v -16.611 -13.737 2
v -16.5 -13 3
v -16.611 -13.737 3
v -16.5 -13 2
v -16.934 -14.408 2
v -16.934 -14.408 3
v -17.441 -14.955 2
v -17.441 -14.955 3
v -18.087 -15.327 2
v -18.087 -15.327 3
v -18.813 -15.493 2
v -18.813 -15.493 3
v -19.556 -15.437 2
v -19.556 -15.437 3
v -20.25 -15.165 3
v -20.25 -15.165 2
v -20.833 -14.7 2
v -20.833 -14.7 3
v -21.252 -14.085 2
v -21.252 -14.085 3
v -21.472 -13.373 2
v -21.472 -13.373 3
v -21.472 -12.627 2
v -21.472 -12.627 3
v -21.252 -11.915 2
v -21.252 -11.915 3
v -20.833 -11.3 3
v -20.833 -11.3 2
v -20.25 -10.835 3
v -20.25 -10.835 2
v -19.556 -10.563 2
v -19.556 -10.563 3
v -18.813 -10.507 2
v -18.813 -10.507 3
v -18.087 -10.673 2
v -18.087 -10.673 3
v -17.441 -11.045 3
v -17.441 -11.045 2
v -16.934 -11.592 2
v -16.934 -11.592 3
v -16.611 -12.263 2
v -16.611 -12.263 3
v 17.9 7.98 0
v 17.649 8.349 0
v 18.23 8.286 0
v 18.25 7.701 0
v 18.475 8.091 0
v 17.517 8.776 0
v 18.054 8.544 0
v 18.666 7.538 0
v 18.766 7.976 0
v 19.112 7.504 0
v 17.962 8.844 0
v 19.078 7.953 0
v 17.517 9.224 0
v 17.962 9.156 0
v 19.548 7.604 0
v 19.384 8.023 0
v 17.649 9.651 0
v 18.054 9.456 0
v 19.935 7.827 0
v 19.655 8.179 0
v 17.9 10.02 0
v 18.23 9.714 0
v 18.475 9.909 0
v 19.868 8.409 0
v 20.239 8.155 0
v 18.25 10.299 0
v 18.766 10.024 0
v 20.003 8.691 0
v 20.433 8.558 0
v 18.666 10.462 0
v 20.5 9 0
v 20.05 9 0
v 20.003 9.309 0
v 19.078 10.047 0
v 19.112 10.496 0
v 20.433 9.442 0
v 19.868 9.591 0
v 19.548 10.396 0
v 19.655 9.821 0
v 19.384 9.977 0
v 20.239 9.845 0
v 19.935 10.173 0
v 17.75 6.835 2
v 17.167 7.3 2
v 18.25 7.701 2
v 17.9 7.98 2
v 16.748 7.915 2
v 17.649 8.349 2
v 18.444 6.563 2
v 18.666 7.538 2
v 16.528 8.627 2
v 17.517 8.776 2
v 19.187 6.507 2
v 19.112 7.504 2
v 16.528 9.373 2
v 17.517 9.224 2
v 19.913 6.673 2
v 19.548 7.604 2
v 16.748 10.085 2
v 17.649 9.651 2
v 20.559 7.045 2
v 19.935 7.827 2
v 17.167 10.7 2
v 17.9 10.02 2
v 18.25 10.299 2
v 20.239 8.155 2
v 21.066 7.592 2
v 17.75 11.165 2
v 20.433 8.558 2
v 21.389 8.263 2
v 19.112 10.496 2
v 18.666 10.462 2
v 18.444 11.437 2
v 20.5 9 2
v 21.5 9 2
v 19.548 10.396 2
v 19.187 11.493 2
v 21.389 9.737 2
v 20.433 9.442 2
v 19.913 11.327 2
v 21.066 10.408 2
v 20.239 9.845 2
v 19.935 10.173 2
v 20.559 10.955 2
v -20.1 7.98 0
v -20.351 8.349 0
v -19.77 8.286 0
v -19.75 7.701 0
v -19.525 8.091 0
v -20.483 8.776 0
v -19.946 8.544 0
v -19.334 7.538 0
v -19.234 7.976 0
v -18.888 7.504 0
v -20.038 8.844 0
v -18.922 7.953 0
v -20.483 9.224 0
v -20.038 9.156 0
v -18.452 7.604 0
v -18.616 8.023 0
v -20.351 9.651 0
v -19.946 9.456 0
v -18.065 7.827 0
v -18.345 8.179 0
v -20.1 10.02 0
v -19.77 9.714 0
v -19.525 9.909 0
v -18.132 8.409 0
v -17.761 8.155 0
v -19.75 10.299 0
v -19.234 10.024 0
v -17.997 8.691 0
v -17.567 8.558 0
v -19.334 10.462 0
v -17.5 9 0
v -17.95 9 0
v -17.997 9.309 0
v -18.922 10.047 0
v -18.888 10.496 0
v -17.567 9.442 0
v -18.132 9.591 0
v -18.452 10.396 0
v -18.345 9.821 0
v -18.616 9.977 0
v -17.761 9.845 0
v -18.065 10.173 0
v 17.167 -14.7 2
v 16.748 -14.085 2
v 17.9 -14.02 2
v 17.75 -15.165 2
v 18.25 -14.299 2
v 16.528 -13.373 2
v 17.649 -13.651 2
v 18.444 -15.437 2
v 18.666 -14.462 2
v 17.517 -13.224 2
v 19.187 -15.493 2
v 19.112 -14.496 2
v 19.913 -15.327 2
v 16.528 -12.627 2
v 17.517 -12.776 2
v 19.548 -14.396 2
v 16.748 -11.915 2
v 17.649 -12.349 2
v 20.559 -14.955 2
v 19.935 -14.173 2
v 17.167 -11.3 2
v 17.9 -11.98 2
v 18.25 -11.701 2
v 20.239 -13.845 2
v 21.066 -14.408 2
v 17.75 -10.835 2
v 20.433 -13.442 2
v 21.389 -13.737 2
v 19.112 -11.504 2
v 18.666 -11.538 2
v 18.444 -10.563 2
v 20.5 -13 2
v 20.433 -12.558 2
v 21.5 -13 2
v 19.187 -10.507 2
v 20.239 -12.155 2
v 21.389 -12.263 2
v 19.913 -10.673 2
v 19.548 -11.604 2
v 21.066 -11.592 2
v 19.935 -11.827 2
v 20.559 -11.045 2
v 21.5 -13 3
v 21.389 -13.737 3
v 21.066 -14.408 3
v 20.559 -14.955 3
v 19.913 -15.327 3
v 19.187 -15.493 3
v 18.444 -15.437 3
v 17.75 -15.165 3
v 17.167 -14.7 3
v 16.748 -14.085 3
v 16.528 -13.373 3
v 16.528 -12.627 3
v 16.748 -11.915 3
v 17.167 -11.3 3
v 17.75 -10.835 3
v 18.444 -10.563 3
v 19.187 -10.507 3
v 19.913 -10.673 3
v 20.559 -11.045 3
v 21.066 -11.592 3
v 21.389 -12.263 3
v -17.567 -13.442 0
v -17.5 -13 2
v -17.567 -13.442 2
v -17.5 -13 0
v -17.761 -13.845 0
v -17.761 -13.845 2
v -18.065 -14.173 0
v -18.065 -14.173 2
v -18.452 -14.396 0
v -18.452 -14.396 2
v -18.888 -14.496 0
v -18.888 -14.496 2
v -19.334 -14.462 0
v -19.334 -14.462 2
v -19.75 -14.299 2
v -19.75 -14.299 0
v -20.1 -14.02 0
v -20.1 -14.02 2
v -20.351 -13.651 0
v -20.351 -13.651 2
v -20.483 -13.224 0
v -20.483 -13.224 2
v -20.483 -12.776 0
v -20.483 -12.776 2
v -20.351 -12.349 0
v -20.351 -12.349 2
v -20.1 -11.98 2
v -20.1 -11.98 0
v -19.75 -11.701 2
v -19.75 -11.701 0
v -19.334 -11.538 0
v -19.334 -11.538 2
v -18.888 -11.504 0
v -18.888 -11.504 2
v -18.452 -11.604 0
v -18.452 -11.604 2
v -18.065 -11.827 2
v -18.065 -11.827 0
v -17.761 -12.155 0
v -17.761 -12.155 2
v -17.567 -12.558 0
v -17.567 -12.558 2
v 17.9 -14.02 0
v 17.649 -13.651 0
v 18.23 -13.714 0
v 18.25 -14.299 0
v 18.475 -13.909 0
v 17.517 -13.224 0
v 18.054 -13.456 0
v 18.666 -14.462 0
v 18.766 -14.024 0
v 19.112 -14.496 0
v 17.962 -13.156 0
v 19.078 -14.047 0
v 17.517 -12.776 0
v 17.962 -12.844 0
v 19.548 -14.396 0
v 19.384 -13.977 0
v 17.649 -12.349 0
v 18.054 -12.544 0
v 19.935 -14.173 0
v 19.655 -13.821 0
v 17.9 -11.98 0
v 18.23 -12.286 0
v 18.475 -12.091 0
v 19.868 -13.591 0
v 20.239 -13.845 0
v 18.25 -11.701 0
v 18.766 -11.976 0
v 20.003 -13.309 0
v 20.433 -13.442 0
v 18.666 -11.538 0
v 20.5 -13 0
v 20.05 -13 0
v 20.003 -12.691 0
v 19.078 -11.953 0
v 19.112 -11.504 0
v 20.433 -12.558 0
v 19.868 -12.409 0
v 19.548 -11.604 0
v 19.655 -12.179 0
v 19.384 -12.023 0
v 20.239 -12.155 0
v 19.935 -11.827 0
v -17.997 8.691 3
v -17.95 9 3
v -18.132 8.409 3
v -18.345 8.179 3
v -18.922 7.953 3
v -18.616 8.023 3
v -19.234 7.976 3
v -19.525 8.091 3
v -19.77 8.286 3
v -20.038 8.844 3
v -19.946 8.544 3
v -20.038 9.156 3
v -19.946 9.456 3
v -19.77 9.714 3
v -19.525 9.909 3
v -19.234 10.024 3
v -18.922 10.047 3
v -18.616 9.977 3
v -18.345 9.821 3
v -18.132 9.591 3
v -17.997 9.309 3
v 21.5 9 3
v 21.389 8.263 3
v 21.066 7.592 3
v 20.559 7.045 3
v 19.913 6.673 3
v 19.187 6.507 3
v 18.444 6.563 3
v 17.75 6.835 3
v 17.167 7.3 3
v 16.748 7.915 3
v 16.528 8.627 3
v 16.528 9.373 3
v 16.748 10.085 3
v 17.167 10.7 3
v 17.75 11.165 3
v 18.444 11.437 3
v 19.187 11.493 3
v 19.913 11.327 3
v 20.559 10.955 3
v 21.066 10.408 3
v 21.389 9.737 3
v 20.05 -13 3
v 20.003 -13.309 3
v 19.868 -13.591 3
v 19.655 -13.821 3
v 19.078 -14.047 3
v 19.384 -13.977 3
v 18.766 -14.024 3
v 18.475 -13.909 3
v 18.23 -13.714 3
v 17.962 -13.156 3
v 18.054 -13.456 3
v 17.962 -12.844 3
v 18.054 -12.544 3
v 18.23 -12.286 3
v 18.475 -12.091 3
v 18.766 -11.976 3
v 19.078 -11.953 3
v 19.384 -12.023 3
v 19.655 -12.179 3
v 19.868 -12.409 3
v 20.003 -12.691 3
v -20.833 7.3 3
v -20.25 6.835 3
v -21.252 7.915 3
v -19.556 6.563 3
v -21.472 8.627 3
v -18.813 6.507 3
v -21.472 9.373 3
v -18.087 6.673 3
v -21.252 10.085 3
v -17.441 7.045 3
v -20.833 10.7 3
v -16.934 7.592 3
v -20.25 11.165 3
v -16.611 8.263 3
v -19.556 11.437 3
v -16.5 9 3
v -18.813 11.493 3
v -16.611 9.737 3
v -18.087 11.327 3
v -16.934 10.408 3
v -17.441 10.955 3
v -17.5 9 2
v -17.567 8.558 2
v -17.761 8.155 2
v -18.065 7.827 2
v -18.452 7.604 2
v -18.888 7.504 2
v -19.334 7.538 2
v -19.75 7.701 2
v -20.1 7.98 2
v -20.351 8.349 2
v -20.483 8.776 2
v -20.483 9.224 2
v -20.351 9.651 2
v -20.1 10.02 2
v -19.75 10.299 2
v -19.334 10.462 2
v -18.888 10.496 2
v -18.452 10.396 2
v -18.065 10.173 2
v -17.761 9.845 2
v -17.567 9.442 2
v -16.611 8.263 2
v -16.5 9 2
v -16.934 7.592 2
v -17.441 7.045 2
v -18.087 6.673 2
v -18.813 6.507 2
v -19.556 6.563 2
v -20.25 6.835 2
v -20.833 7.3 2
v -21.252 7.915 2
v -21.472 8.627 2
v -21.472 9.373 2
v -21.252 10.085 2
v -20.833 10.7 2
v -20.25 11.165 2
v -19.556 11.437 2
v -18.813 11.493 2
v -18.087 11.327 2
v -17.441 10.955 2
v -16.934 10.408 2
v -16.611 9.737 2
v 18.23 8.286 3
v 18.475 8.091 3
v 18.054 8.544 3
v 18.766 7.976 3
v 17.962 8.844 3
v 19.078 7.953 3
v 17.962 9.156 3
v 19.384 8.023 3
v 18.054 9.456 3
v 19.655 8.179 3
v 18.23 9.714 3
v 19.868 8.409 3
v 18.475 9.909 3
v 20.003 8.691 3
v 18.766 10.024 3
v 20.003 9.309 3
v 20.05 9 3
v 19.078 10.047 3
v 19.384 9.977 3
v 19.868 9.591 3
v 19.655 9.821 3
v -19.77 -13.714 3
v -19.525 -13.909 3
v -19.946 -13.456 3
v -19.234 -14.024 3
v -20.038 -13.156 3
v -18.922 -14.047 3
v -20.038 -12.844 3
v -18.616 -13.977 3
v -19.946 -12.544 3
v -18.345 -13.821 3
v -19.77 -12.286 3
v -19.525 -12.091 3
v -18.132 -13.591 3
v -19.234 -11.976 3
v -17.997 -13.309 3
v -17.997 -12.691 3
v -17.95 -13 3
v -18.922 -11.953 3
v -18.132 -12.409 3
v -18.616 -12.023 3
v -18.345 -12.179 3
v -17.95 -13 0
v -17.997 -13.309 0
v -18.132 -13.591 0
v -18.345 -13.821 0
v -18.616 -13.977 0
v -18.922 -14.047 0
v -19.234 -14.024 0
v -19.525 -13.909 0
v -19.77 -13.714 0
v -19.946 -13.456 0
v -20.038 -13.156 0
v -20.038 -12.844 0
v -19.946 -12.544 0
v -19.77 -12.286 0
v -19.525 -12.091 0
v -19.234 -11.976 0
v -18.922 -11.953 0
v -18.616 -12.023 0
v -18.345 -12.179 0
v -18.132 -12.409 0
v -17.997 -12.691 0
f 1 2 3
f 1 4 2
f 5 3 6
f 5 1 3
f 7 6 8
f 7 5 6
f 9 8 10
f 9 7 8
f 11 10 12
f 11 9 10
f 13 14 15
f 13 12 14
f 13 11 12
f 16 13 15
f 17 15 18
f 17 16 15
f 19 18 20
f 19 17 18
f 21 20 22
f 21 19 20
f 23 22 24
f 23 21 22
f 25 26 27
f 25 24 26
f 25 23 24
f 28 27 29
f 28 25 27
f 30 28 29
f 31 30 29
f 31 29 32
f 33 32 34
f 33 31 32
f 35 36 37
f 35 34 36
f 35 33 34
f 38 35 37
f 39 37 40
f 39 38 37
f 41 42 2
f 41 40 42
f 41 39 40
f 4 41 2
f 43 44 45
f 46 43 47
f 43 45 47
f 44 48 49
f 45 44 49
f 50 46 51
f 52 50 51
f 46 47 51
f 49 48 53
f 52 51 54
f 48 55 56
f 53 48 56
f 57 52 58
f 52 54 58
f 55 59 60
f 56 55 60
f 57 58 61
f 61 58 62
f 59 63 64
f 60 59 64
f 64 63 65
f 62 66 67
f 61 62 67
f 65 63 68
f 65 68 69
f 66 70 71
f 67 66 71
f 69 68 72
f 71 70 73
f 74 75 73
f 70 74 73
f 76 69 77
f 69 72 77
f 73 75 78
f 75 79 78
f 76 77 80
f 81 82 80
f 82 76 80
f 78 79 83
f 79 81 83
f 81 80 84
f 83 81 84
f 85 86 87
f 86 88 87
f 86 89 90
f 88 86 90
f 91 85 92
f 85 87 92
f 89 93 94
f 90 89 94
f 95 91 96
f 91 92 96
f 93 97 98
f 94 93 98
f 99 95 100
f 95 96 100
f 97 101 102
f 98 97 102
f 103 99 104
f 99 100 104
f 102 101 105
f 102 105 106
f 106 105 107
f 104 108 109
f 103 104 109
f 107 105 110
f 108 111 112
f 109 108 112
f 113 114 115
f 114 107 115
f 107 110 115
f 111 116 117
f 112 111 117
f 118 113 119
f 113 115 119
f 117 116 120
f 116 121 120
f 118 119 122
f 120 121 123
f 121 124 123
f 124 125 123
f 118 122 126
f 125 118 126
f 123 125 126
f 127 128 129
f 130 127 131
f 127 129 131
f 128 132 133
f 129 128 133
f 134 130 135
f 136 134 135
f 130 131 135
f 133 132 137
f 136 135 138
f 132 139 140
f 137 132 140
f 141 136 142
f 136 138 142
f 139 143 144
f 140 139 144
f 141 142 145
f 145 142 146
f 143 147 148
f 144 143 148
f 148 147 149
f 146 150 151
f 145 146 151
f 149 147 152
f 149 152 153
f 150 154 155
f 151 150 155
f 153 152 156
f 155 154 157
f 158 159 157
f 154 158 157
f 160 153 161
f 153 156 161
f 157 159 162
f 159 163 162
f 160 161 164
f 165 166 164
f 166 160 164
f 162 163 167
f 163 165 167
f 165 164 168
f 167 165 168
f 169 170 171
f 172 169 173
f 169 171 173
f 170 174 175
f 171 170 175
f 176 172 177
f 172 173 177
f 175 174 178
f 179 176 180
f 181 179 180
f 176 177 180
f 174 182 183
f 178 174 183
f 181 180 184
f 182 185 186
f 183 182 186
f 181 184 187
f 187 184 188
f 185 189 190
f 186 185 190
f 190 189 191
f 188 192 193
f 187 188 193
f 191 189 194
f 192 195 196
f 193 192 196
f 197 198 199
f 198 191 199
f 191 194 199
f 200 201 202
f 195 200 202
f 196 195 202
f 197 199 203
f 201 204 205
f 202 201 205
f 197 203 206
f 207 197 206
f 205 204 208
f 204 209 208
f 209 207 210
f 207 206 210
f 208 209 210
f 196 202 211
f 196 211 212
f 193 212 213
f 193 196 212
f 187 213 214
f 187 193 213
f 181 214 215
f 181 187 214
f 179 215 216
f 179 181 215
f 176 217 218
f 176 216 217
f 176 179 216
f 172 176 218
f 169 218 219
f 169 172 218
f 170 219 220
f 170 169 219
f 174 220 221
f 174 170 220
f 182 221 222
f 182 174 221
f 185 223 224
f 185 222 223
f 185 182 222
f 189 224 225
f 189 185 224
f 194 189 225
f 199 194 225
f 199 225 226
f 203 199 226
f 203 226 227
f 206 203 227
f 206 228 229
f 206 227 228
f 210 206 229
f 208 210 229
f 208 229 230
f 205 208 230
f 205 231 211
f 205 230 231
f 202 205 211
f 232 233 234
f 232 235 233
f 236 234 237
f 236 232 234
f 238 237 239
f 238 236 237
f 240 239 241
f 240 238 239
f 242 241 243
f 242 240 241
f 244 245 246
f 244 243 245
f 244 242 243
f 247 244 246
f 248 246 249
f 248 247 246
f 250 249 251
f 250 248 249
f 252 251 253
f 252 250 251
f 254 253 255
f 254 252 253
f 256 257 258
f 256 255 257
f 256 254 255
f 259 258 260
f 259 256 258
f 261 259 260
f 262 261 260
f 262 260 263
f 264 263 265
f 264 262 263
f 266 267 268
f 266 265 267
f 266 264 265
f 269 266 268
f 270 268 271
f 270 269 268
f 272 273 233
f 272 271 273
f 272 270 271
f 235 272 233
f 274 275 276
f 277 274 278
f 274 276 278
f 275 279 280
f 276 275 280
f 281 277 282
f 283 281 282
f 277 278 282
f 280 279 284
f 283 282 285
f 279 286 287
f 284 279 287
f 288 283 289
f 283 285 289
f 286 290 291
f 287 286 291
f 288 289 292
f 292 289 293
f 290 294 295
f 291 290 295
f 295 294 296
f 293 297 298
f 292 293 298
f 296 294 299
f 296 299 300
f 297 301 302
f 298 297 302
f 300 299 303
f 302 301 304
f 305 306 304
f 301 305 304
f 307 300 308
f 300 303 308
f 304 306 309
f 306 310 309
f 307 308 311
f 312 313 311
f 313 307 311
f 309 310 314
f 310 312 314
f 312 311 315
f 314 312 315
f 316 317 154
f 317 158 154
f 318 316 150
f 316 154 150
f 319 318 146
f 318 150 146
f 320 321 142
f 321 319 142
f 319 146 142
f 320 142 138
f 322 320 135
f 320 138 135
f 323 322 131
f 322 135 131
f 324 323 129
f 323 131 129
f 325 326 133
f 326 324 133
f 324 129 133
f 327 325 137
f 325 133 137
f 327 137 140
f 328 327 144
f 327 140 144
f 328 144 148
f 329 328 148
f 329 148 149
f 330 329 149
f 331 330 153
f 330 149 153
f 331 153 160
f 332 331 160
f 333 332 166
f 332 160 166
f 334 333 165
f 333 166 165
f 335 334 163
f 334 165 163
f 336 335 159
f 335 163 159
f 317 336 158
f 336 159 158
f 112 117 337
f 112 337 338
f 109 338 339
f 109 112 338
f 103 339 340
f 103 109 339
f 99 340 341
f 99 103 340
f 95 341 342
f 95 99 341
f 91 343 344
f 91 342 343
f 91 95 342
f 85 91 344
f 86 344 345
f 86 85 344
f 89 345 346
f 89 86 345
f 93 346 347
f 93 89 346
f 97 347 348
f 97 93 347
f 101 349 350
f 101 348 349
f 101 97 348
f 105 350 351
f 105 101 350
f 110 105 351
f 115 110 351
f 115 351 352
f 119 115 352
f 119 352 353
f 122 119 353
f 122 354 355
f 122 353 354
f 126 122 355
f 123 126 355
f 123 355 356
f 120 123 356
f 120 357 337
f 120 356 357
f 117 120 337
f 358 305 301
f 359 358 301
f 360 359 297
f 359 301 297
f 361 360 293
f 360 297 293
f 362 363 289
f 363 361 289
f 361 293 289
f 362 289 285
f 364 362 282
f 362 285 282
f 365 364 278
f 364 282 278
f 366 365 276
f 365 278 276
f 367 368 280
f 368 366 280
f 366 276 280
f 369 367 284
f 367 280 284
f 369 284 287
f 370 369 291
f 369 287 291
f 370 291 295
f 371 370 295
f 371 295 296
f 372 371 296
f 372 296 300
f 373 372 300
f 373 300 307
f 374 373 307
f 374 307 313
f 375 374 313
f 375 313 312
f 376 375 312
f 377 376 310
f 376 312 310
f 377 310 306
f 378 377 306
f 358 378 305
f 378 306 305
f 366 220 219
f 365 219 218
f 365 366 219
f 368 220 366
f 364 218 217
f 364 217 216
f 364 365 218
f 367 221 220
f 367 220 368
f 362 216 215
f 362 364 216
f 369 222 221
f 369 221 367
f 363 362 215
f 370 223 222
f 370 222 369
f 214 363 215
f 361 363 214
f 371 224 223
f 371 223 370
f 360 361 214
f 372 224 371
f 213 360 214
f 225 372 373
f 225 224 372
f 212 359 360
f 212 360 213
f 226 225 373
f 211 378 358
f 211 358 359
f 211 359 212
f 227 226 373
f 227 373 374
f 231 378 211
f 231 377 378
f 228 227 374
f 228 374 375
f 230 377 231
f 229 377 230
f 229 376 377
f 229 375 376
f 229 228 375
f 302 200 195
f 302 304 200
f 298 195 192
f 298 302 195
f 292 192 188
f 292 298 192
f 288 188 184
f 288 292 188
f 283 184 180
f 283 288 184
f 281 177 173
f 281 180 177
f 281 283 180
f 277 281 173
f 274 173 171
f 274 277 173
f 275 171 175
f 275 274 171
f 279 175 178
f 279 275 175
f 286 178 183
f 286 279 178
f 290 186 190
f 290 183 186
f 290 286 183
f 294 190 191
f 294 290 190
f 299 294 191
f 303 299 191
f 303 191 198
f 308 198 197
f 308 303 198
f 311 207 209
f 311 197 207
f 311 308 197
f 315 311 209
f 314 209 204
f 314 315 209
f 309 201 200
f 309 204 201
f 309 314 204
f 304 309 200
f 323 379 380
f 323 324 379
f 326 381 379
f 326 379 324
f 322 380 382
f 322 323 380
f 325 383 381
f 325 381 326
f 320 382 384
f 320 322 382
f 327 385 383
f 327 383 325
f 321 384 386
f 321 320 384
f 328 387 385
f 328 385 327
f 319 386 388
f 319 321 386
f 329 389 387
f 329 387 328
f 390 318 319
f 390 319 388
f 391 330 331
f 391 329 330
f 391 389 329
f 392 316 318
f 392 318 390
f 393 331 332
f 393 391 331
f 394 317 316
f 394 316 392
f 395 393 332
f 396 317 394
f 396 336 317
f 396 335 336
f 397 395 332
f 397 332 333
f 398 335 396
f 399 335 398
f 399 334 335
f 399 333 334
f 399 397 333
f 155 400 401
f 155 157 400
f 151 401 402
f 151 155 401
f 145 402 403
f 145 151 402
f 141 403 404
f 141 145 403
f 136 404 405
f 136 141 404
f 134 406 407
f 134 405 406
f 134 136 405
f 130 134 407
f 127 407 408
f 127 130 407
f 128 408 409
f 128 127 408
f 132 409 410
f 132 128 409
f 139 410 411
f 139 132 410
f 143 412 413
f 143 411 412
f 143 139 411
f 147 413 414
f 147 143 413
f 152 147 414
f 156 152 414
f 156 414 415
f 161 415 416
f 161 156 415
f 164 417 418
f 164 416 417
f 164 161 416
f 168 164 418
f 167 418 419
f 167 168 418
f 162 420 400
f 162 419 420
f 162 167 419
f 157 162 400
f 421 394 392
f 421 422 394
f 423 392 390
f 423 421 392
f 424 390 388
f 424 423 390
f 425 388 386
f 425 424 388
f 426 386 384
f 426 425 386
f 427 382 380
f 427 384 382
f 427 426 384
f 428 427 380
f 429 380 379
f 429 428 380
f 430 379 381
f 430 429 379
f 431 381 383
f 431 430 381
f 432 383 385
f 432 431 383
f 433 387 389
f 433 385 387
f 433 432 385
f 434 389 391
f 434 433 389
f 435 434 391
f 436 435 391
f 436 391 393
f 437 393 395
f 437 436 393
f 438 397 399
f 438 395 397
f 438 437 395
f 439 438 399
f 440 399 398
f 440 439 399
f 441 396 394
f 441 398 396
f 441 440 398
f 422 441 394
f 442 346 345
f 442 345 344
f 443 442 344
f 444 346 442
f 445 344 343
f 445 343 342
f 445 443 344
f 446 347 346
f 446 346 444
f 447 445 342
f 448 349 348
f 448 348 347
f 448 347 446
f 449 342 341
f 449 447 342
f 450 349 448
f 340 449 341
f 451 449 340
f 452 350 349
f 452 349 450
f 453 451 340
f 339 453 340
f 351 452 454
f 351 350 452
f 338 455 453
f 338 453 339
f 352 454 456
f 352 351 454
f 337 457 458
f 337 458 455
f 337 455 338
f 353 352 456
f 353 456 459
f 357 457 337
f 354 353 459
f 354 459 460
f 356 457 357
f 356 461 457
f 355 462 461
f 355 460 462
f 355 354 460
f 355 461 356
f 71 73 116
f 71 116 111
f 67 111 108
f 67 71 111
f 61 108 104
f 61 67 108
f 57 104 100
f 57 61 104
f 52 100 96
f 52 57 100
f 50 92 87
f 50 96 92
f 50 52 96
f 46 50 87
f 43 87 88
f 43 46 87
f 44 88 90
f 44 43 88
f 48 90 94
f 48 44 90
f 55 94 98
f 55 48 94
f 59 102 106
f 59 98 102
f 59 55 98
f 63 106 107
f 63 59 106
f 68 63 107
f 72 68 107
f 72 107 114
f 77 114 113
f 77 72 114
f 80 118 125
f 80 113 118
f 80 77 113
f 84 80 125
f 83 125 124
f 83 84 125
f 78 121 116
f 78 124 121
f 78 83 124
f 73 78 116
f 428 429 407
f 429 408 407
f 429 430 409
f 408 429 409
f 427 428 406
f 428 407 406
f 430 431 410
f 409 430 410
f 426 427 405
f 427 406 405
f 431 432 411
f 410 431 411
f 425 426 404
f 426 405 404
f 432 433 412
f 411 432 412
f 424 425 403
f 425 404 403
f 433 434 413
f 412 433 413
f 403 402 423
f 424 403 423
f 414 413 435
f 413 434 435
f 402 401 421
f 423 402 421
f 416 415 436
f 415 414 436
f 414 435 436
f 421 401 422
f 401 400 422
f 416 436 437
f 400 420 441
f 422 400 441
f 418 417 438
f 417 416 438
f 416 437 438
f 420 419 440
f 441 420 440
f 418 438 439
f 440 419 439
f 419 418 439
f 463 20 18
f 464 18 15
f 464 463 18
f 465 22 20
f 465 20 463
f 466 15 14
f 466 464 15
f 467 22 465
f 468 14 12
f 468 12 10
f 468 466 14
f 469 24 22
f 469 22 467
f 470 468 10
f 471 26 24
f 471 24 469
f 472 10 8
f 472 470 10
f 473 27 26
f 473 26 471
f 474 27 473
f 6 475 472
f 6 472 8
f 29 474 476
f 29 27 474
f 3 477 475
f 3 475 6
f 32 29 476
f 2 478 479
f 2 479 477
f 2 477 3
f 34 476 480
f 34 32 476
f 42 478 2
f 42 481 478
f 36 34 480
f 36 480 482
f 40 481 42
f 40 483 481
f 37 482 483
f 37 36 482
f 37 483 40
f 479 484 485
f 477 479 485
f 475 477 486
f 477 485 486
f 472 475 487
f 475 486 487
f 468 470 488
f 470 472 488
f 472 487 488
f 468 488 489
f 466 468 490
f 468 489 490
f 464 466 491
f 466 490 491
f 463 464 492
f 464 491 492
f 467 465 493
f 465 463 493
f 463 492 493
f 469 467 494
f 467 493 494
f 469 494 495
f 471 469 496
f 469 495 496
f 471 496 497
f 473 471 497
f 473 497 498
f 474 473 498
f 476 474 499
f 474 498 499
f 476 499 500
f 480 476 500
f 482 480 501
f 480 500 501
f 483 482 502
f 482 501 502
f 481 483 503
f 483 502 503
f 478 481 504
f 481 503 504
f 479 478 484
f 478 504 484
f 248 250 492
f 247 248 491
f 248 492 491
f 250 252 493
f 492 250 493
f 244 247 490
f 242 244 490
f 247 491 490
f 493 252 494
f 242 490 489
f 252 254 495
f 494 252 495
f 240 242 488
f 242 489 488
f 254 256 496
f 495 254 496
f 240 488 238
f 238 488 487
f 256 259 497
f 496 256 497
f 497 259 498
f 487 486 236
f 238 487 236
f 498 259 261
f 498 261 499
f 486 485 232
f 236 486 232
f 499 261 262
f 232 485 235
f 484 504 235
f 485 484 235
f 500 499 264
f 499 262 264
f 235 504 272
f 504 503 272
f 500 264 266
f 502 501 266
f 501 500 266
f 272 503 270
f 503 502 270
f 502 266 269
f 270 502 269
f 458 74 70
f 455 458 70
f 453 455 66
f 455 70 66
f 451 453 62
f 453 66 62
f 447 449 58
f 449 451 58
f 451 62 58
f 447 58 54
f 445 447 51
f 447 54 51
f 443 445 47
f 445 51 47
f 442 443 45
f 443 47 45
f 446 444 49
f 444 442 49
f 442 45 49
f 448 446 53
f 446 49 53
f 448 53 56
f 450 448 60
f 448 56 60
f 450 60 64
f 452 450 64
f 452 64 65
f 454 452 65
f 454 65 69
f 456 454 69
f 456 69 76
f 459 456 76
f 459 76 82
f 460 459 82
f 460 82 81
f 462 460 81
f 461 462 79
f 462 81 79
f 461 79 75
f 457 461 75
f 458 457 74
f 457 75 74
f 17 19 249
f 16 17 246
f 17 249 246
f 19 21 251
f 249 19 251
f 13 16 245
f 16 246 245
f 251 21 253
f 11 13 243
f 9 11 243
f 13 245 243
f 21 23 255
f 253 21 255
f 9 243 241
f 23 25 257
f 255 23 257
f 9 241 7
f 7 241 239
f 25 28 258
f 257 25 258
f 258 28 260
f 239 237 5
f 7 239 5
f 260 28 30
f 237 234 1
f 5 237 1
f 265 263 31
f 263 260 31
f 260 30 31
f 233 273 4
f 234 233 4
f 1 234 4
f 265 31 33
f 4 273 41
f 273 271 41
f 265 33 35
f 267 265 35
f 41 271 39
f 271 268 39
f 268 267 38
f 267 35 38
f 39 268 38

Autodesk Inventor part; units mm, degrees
ref_plane "YZ Plane" through (0, 0, 0) normal (1, 0, 0) x (0, 1, 0)
ref_plane "XZ Plane" through (0, 0, 0) normal (0, 1, 0) x (-1, 0, 0)
ref_plane "XY Plane" through (0, 0, 0) normal (0, 0, 1) x (1, 0, 0)
sketch "スケッチ1" plane through (0, 0, 0) normal (0, 0, 1) x (1, 0, 0)
  circle A0 centre (-19, 9) radius 1.05
  circle A1 centre (19, 9) radius 1.05
  circle A2 centre (-19, -13) radius 1.05
  circle A3 centre (19, -13) radius 1.05
  circle A4 centre (-19, 9) radius 1.5
  circle A5 centre (-19, -13) radius 1.5
  circle A6 centre (19, -13) radius 1.5
  circle A7 centre (19, 9) radius 1.5
  circle A8 centre (-19, 9) radius 0.8 construction
  circle A9 centre (-19, -13) radius 0.8 construction
  line L0 (0, 0) -> (0, 11.6821) construction
  dimension "d0" = 2.1
  dimension "d3" = 3
extrude "押し出し1" add sketch "スケッチ1" along normal blind 2
sketch "スケッチ2" plane through (-19, 9, 2) normal (0, 0, 1) x (1, 0, 0)
  circle A0 centre (0, 0) radius 1.05 projected
  circle A1 centre (0, -22) radius 1.05 projected
  circle A2 centre (38, -22) radius 1.05 projected
  circle A3 centre (38, 0) radius 1.05 projected
  circle A4 centre (0, 0) radius 1.05 projected
  circle A5 centre (0, 0) radius 2.5
  circle A6 centre (0, -22) radius 2.5
  circle A7 centre (38, -22) radius 2.5
  circle A8 centre (38, 0) radius 2.5
  point P0 (19, -9)
  dimension "d4" = 5
extrude "押し出し2" add sketch "スケッチ2" along normal blind 1
properties part number "16_038_BATTERY_LIB_HOOK_R1"
